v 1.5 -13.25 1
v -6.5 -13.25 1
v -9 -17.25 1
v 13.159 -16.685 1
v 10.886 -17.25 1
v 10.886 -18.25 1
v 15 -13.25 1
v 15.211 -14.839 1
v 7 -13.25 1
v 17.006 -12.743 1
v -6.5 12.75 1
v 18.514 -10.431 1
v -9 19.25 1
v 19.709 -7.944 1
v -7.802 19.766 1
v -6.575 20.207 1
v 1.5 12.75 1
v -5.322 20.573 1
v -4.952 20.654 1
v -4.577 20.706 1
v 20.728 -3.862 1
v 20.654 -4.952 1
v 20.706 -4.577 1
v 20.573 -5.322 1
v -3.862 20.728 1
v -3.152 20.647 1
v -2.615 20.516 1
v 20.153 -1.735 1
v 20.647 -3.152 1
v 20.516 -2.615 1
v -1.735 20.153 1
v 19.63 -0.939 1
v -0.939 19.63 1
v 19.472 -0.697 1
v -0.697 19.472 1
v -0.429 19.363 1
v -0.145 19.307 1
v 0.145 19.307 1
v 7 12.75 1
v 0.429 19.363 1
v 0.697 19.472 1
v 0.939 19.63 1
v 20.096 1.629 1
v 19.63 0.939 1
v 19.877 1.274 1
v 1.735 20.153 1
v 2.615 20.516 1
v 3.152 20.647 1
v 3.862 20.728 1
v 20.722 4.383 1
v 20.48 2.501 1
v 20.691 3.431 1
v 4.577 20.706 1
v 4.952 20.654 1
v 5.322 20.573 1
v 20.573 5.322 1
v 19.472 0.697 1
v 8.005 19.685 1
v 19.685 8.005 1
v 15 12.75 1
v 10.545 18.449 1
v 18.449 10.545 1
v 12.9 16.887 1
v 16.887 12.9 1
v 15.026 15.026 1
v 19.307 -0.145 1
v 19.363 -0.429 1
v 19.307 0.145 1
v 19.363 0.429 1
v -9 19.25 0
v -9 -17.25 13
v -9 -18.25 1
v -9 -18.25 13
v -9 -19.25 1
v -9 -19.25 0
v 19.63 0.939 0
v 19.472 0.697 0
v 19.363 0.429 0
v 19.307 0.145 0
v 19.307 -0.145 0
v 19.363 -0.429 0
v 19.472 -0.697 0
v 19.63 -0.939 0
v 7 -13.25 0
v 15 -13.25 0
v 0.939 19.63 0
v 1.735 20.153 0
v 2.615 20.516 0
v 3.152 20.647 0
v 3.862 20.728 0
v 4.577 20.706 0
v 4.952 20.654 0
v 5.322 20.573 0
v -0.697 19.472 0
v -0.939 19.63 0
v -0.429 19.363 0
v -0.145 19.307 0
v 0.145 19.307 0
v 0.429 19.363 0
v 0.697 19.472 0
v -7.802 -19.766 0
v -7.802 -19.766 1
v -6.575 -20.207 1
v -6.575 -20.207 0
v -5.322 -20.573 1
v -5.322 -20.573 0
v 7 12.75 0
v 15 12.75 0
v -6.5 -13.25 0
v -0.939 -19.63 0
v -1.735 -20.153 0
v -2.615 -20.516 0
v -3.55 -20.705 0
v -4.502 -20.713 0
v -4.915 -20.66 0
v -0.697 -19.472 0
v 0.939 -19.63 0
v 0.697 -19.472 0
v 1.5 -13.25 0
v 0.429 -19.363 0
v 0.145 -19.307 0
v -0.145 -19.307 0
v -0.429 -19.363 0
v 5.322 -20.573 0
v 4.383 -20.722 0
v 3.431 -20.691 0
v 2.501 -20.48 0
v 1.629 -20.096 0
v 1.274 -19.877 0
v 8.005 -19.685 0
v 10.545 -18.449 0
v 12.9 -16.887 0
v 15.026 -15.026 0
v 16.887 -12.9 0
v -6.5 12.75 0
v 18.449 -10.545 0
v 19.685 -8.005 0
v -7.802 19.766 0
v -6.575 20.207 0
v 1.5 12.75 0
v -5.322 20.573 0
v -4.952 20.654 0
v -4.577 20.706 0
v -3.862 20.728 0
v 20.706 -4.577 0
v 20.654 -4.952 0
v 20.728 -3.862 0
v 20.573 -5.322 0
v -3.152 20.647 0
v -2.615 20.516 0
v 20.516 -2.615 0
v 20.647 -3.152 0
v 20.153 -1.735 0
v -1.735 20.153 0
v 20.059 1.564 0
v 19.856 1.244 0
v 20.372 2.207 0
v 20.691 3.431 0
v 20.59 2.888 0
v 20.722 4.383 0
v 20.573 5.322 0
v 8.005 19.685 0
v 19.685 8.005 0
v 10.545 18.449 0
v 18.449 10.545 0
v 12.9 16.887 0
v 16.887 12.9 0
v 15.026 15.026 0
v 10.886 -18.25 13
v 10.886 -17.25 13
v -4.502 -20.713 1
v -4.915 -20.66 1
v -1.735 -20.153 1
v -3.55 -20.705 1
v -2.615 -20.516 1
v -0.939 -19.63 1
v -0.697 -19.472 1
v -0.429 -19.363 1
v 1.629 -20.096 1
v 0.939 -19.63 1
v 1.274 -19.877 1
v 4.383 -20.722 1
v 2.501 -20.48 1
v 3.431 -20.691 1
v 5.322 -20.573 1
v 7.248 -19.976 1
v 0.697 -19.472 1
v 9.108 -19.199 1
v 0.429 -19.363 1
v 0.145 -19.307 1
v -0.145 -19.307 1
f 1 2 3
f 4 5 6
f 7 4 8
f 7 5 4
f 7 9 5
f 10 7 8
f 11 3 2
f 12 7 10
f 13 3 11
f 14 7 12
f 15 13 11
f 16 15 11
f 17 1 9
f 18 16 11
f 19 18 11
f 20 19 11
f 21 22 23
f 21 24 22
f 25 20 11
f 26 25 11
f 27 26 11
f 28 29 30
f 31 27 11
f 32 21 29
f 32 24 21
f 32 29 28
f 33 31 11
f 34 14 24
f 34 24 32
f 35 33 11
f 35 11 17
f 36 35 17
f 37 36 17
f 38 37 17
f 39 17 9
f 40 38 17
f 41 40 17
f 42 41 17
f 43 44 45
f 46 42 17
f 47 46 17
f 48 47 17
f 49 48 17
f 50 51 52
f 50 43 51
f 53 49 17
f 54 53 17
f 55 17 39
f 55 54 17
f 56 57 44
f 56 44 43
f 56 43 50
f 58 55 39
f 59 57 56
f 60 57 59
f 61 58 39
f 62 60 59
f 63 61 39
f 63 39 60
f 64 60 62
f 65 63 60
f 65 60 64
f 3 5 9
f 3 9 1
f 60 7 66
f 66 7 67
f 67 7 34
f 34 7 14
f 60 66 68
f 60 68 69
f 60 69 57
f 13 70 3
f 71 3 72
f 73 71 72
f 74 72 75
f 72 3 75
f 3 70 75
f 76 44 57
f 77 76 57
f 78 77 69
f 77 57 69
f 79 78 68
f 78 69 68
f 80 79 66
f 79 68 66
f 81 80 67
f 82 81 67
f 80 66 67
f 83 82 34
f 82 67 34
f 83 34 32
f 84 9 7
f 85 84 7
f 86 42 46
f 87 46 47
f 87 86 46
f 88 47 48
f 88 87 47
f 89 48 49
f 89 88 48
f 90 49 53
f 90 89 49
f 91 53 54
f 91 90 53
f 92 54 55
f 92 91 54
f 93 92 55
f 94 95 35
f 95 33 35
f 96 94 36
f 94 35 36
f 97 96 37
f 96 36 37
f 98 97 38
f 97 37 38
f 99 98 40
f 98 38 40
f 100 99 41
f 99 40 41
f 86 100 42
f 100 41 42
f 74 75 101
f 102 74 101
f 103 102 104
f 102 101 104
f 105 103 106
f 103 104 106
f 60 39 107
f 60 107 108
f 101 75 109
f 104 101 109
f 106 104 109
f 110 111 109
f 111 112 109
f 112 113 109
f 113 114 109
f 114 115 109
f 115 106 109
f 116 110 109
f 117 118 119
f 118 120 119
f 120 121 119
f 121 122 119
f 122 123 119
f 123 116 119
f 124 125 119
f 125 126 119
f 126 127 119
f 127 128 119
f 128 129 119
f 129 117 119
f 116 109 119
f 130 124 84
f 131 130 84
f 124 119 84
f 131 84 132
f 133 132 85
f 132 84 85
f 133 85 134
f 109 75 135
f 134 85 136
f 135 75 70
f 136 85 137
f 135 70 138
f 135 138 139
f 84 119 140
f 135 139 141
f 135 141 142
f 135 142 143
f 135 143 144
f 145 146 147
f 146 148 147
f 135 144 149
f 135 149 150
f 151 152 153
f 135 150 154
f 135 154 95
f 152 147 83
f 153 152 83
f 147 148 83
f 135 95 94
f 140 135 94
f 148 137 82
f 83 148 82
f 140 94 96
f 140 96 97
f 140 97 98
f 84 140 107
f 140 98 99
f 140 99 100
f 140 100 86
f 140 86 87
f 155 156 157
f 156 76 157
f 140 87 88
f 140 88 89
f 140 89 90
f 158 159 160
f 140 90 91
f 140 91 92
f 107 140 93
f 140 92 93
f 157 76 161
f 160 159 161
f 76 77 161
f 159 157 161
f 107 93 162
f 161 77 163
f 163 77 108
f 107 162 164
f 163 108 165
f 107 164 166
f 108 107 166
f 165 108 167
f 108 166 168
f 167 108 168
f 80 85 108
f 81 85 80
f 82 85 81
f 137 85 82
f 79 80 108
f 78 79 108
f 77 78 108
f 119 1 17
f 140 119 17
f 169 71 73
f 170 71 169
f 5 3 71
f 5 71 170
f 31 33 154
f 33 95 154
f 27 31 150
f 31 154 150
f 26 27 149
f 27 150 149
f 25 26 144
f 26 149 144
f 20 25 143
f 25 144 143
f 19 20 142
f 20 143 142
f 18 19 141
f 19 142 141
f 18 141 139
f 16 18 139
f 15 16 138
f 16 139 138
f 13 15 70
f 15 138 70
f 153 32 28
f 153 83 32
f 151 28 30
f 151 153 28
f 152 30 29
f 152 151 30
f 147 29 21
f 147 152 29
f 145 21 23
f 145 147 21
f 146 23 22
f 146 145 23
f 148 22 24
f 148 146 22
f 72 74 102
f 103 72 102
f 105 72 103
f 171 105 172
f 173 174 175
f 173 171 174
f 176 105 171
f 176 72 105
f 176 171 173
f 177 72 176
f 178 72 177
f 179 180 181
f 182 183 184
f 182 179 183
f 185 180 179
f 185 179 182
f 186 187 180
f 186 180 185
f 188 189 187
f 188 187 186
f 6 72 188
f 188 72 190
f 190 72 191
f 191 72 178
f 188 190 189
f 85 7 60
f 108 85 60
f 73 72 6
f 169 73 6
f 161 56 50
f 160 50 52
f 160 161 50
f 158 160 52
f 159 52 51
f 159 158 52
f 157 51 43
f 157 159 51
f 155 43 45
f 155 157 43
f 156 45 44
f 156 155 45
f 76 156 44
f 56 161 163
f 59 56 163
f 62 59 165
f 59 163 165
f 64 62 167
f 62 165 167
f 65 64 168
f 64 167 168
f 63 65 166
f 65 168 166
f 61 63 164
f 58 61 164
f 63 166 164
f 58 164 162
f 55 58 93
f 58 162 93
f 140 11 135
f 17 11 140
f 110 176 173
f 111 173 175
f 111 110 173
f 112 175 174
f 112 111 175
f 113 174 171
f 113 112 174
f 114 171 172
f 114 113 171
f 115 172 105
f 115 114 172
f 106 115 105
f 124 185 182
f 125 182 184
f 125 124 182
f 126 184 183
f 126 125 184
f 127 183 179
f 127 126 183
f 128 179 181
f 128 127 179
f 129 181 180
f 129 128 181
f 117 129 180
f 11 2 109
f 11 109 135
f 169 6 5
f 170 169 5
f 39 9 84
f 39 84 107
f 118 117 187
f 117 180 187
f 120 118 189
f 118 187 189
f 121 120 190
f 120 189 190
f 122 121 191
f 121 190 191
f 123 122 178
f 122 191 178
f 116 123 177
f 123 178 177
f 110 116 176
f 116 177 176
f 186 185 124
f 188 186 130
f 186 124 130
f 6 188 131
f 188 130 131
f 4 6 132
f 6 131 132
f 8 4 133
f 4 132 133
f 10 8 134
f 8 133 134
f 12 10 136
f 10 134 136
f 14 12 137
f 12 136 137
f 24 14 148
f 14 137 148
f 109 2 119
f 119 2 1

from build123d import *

# Parameters (mm, degrees)
F1_DEPTH = 1
F2_W     = 19.8857705285
F2_H     = 1
F3_DEPTH = 12
F4_W     = 8
F4_H     = 26
F5_DEPTH = 1.001
F6_R     = 1.5
F7_DEPTH = 1.001
F8_R     = 5


with BuildPart() as f1:
    # F0 (on Top) → F1 (new body)
    with BuildSketch(Plane.XY):
        with BuildLine():
            Line((-9, 19.25), (-9, -19.25))
            ThreePointArc((-9, -19.25), (21.25, 0), (-9, 19.25))
        make_face()
    extrude(amount=F1_DEPTH)

    # F2 (on face) → F3 (join)
    with BuildSketch(Plane.XY.offset(1)):
        with Locations((0.9428852643, -17.75)):
            Rectangle(F2_W, F2_H)
    extrude(amount=F3_DEPTH)

    # F4 (on face) → F5 (cut, through all)
    with BuildSketch(Plane.XY.offset(1)):
        with Locations((-2.5, -0.25)):
            Rectangle(F4_W, F4_H)
        with Locations((11, -0.25)):
            Rectangle(F4_W, F4_H)
    extrude(amount=-F5_DEPTH, mode=Mode.SUBTRACT)

    # F6 (on face) → F7 (cut, through all)
    with BuildSketch(Plane.XY.offset(1)):
        with Locations((0, -20.8)):
            Circle(F6_R)
        with Locations((20.8, 0)):
            Circle(F6_R)
        with Locations((0, 20.8)):
            Circle(F6_R)
        with Locations((-20.8, 0)):
            Circle(F6_R)
    extrude(amount=-F7_DEPTH, mode=Mode.SUBTRACT)

    # F8
    f8_edges = [f1.edges().sort_by_distance(p)[0] for p in [
        (1.445467, -21.200781, 0.5),
        (-1.445467, -21.200781, 0.5),
        (21.200781, 1.445467, 0.5),
        (21.200781, -1.445467, 0.5),
        (1.445467, 21.200781, 0.5),
        (-1.445467, 21.200781, 0.5),
    ]]
    fillet(f8_edges, radius=F8_R)


solid = f1.part
